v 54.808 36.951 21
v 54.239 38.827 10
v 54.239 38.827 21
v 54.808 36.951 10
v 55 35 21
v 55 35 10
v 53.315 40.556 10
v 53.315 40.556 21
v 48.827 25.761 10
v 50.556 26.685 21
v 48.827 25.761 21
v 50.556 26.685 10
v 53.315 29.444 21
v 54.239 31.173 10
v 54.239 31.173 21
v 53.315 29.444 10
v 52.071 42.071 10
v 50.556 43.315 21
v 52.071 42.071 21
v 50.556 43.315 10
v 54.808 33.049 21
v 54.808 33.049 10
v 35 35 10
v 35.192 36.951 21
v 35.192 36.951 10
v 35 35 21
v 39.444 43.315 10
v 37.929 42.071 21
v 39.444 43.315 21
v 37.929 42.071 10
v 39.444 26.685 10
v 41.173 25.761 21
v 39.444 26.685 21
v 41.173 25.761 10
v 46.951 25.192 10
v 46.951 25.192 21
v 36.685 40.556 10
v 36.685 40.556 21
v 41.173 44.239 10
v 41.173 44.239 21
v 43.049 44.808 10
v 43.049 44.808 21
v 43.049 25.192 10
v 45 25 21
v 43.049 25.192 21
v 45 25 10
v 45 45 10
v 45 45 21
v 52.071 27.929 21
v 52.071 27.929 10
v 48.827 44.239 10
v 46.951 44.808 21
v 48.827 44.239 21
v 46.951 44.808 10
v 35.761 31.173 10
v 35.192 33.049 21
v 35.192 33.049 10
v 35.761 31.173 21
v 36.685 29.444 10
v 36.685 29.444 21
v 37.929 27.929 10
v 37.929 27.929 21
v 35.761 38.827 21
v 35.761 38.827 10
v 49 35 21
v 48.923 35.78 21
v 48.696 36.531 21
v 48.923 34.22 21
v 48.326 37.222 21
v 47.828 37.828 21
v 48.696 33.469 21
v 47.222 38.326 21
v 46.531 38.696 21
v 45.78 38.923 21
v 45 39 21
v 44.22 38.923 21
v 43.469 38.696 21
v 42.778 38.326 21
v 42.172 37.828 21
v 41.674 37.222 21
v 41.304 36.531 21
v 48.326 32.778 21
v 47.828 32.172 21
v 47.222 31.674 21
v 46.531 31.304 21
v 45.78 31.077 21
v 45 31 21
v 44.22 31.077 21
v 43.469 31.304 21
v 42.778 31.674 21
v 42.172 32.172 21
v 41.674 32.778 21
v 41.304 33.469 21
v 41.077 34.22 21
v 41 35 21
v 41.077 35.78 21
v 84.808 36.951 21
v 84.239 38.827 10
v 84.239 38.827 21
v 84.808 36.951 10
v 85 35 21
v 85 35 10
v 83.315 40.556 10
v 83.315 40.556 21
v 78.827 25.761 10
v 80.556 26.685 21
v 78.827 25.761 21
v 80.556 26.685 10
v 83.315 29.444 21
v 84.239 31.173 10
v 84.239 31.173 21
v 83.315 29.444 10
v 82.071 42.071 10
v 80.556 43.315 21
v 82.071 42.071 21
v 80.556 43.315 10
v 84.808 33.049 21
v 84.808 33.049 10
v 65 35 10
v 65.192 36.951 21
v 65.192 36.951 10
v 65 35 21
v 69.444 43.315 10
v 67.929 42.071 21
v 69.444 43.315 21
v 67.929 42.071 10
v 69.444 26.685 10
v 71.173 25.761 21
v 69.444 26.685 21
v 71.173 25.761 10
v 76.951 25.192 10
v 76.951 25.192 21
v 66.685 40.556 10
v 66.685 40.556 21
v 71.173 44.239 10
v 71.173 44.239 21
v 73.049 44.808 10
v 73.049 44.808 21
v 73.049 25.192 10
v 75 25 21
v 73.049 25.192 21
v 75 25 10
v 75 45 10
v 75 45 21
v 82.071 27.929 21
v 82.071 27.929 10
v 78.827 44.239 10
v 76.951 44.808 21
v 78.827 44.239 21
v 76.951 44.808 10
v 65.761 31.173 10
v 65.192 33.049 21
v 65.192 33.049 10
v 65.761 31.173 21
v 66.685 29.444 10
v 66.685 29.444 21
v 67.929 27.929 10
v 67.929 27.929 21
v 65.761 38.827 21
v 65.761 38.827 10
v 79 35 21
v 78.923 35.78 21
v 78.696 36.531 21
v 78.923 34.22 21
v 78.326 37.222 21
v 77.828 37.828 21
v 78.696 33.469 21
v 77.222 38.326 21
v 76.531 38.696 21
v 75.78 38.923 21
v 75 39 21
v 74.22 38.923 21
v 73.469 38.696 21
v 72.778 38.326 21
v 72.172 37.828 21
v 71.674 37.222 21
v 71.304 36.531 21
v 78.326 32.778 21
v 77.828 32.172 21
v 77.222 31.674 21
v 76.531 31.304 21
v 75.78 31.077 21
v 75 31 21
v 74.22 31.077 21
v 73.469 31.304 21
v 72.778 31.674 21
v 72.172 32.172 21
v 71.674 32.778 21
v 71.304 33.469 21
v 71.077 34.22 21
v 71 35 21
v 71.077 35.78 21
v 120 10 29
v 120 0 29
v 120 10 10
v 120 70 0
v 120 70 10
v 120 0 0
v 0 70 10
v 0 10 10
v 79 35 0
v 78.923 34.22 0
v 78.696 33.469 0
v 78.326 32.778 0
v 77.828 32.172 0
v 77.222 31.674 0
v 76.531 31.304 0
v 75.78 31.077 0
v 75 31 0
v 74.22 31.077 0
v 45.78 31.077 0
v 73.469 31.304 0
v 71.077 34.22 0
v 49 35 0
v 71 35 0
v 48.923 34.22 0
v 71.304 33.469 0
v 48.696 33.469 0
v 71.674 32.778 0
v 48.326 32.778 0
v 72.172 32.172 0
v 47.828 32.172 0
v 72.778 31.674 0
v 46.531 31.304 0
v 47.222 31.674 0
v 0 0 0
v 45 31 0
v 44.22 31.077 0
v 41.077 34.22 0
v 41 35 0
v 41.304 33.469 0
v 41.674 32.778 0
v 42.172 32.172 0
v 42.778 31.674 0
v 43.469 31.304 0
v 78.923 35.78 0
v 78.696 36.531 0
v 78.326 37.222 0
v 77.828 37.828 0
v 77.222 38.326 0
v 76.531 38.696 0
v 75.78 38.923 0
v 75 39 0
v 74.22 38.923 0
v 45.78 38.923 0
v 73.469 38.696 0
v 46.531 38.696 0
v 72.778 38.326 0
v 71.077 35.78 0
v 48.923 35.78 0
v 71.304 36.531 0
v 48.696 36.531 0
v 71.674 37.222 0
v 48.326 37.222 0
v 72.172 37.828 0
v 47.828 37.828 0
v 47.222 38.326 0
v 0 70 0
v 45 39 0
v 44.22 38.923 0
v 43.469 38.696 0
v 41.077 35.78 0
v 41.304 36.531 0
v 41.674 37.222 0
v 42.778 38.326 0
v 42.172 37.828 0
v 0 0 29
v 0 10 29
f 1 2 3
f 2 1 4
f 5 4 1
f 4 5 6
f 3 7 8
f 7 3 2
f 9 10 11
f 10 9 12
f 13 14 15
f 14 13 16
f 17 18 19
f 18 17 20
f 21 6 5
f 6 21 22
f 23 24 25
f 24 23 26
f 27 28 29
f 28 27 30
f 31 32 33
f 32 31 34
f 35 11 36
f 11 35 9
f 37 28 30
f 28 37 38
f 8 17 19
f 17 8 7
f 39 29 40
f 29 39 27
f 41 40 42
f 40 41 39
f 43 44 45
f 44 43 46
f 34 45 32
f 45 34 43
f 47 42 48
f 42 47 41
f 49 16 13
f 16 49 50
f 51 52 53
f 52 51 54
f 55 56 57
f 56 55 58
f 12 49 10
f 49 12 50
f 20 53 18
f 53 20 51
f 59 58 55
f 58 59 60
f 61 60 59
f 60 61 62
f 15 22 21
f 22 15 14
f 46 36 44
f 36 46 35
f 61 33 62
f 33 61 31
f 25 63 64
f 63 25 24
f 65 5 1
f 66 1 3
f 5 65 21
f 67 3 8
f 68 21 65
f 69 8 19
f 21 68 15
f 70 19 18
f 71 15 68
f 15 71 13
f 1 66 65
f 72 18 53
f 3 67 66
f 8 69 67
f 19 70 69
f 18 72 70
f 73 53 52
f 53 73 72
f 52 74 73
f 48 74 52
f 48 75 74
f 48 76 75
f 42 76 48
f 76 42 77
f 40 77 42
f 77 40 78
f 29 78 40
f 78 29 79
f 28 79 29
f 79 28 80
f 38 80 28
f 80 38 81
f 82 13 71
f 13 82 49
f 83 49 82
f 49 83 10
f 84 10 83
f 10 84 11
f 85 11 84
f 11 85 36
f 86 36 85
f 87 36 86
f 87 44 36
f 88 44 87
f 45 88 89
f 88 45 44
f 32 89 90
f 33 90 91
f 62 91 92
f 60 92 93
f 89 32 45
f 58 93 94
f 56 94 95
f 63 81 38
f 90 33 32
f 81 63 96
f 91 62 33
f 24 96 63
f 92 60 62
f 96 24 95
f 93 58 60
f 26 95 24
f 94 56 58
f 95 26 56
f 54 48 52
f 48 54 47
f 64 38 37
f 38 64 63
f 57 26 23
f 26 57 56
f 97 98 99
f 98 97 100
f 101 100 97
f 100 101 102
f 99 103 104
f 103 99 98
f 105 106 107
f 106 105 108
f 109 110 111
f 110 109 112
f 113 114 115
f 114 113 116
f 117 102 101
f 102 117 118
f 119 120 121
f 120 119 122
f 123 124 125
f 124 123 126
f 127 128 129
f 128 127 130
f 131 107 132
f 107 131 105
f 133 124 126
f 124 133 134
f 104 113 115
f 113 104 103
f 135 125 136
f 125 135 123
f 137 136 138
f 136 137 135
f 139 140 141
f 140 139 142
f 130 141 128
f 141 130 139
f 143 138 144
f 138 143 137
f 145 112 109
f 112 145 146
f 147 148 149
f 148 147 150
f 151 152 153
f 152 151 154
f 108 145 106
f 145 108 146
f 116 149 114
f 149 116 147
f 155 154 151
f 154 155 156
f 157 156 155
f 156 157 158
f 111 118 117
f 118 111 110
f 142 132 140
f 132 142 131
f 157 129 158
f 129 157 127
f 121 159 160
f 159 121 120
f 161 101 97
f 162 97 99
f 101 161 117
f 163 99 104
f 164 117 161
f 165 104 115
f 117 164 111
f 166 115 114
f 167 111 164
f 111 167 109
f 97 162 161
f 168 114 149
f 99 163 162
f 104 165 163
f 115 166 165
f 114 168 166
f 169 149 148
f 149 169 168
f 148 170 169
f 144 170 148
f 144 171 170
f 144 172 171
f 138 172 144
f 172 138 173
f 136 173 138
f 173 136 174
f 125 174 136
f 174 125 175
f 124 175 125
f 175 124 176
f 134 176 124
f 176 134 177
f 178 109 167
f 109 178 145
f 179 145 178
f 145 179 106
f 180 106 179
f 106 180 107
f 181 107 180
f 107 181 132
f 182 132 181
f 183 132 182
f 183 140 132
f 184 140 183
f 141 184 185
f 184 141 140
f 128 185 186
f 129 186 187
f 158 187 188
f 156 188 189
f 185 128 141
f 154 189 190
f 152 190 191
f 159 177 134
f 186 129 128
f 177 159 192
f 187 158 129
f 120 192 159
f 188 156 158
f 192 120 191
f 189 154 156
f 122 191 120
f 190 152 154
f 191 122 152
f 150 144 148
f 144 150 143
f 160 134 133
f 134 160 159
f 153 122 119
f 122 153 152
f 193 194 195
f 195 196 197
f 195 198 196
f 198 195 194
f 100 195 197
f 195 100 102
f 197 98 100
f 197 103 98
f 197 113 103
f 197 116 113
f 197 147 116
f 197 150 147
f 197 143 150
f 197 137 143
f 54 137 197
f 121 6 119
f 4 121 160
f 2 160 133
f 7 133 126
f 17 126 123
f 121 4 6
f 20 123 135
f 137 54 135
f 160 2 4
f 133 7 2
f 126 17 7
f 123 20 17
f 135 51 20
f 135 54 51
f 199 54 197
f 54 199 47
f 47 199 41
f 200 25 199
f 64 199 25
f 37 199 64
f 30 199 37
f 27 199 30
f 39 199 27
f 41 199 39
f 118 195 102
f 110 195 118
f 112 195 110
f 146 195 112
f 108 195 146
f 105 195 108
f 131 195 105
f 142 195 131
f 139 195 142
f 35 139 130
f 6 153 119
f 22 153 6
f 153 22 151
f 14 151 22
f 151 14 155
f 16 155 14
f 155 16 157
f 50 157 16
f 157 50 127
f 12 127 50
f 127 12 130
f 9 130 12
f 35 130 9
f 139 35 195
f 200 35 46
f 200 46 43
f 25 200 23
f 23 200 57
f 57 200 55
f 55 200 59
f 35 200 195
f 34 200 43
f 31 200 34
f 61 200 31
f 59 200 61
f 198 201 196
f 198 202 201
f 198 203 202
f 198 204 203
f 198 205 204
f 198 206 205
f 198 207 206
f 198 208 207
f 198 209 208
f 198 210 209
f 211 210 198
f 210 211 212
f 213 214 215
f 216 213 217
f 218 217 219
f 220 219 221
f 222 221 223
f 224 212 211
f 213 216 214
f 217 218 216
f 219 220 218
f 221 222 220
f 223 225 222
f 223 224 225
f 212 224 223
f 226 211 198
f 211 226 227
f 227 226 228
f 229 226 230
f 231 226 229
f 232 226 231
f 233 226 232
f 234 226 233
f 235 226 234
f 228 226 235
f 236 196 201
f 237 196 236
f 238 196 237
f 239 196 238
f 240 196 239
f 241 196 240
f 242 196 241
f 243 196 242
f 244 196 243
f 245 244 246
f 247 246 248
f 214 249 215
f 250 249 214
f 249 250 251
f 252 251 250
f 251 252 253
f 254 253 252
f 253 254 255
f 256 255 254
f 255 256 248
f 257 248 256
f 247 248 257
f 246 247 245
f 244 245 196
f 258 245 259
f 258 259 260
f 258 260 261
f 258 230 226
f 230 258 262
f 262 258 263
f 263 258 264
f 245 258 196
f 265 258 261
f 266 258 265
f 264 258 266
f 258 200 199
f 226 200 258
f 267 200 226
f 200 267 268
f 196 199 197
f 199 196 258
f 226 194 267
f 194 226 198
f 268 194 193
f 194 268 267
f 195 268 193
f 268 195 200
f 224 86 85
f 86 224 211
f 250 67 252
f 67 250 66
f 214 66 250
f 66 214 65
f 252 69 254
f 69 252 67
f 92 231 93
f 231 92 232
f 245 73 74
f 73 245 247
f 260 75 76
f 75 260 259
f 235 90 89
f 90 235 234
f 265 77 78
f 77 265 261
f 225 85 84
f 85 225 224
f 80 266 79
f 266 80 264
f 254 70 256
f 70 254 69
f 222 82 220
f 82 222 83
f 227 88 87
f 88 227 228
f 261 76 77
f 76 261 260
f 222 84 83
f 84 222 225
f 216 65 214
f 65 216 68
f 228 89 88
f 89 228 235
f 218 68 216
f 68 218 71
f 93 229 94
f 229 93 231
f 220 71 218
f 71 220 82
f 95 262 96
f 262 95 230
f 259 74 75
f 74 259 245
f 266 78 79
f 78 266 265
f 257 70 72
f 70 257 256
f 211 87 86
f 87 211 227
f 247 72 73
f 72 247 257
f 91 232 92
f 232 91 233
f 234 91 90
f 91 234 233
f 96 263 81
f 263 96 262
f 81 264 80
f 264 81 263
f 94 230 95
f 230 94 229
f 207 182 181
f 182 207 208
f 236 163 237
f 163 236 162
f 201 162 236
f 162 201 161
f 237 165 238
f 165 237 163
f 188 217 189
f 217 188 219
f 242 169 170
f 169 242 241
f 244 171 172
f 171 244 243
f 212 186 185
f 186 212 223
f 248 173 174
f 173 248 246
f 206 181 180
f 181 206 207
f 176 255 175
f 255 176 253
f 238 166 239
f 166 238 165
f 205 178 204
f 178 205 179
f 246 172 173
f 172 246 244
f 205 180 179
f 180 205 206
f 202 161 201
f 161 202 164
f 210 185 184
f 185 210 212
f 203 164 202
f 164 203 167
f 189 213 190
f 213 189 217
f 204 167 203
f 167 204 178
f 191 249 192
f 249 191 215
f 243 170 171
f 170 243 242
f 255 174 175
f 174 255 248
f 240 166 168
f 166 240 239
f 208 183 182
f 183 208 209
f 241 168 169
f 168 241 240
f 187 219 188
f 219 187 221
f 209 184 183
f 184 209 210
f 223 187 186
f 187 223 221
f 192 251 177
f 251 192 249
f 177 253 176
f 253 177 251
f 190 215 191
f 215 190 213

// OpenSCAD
$fn = 32;

// ----------------------------------------------------------------------
// Drill jig: fence jig
// ----------------------------------------------------------------------

// --- parameters (mm) ---
plate_l = 120;            // plate length, X
plate_w = 70;             // plate width, Y
plate_t = 10;             // plate thickness
boss_d = 20;              // guide boss diameter
boss_h = 12;              // boss height above the plate
guide_d = 8;              // guide hole diameter
boss_pitch = 30;          // boss pitch
fence_h = 20;             // fence height above the plate
fence_t = 10;             // fence thickness

n_boss = 2;  // guide bosses
boss_x0 = (plate_l - (n_boss - 1) * boss_pitch) / 2;  // first boss X
boss_top = plate_t - 1 + boss_h;  // boss crown height
fence_top = plate_t - 1 + fence_h;  // fence crown height
total_h = max([fence_top, boss_top]);  // overall height

difference() {
  union() {
  cube([plate_l, plate_w, plate_t]);
  for (i = [0 : n_boss - 1])
    translate([boss_x0 + i * boss_pitch, plate_w / 2, plate_t - 1])
      cylinder(h = boss_h, d = boss_d);
  translate([0, 0, plate_t - 1]) cube([plate_l, fence_t, fence_h]);
  }
  for (i = [0 : n_boss - 1])
    translate([boss_x0 + i * boss_pitch, plate_w / 2, -1])
      cylinder(h = plate_t + boss_h, d = guide_d);
}
